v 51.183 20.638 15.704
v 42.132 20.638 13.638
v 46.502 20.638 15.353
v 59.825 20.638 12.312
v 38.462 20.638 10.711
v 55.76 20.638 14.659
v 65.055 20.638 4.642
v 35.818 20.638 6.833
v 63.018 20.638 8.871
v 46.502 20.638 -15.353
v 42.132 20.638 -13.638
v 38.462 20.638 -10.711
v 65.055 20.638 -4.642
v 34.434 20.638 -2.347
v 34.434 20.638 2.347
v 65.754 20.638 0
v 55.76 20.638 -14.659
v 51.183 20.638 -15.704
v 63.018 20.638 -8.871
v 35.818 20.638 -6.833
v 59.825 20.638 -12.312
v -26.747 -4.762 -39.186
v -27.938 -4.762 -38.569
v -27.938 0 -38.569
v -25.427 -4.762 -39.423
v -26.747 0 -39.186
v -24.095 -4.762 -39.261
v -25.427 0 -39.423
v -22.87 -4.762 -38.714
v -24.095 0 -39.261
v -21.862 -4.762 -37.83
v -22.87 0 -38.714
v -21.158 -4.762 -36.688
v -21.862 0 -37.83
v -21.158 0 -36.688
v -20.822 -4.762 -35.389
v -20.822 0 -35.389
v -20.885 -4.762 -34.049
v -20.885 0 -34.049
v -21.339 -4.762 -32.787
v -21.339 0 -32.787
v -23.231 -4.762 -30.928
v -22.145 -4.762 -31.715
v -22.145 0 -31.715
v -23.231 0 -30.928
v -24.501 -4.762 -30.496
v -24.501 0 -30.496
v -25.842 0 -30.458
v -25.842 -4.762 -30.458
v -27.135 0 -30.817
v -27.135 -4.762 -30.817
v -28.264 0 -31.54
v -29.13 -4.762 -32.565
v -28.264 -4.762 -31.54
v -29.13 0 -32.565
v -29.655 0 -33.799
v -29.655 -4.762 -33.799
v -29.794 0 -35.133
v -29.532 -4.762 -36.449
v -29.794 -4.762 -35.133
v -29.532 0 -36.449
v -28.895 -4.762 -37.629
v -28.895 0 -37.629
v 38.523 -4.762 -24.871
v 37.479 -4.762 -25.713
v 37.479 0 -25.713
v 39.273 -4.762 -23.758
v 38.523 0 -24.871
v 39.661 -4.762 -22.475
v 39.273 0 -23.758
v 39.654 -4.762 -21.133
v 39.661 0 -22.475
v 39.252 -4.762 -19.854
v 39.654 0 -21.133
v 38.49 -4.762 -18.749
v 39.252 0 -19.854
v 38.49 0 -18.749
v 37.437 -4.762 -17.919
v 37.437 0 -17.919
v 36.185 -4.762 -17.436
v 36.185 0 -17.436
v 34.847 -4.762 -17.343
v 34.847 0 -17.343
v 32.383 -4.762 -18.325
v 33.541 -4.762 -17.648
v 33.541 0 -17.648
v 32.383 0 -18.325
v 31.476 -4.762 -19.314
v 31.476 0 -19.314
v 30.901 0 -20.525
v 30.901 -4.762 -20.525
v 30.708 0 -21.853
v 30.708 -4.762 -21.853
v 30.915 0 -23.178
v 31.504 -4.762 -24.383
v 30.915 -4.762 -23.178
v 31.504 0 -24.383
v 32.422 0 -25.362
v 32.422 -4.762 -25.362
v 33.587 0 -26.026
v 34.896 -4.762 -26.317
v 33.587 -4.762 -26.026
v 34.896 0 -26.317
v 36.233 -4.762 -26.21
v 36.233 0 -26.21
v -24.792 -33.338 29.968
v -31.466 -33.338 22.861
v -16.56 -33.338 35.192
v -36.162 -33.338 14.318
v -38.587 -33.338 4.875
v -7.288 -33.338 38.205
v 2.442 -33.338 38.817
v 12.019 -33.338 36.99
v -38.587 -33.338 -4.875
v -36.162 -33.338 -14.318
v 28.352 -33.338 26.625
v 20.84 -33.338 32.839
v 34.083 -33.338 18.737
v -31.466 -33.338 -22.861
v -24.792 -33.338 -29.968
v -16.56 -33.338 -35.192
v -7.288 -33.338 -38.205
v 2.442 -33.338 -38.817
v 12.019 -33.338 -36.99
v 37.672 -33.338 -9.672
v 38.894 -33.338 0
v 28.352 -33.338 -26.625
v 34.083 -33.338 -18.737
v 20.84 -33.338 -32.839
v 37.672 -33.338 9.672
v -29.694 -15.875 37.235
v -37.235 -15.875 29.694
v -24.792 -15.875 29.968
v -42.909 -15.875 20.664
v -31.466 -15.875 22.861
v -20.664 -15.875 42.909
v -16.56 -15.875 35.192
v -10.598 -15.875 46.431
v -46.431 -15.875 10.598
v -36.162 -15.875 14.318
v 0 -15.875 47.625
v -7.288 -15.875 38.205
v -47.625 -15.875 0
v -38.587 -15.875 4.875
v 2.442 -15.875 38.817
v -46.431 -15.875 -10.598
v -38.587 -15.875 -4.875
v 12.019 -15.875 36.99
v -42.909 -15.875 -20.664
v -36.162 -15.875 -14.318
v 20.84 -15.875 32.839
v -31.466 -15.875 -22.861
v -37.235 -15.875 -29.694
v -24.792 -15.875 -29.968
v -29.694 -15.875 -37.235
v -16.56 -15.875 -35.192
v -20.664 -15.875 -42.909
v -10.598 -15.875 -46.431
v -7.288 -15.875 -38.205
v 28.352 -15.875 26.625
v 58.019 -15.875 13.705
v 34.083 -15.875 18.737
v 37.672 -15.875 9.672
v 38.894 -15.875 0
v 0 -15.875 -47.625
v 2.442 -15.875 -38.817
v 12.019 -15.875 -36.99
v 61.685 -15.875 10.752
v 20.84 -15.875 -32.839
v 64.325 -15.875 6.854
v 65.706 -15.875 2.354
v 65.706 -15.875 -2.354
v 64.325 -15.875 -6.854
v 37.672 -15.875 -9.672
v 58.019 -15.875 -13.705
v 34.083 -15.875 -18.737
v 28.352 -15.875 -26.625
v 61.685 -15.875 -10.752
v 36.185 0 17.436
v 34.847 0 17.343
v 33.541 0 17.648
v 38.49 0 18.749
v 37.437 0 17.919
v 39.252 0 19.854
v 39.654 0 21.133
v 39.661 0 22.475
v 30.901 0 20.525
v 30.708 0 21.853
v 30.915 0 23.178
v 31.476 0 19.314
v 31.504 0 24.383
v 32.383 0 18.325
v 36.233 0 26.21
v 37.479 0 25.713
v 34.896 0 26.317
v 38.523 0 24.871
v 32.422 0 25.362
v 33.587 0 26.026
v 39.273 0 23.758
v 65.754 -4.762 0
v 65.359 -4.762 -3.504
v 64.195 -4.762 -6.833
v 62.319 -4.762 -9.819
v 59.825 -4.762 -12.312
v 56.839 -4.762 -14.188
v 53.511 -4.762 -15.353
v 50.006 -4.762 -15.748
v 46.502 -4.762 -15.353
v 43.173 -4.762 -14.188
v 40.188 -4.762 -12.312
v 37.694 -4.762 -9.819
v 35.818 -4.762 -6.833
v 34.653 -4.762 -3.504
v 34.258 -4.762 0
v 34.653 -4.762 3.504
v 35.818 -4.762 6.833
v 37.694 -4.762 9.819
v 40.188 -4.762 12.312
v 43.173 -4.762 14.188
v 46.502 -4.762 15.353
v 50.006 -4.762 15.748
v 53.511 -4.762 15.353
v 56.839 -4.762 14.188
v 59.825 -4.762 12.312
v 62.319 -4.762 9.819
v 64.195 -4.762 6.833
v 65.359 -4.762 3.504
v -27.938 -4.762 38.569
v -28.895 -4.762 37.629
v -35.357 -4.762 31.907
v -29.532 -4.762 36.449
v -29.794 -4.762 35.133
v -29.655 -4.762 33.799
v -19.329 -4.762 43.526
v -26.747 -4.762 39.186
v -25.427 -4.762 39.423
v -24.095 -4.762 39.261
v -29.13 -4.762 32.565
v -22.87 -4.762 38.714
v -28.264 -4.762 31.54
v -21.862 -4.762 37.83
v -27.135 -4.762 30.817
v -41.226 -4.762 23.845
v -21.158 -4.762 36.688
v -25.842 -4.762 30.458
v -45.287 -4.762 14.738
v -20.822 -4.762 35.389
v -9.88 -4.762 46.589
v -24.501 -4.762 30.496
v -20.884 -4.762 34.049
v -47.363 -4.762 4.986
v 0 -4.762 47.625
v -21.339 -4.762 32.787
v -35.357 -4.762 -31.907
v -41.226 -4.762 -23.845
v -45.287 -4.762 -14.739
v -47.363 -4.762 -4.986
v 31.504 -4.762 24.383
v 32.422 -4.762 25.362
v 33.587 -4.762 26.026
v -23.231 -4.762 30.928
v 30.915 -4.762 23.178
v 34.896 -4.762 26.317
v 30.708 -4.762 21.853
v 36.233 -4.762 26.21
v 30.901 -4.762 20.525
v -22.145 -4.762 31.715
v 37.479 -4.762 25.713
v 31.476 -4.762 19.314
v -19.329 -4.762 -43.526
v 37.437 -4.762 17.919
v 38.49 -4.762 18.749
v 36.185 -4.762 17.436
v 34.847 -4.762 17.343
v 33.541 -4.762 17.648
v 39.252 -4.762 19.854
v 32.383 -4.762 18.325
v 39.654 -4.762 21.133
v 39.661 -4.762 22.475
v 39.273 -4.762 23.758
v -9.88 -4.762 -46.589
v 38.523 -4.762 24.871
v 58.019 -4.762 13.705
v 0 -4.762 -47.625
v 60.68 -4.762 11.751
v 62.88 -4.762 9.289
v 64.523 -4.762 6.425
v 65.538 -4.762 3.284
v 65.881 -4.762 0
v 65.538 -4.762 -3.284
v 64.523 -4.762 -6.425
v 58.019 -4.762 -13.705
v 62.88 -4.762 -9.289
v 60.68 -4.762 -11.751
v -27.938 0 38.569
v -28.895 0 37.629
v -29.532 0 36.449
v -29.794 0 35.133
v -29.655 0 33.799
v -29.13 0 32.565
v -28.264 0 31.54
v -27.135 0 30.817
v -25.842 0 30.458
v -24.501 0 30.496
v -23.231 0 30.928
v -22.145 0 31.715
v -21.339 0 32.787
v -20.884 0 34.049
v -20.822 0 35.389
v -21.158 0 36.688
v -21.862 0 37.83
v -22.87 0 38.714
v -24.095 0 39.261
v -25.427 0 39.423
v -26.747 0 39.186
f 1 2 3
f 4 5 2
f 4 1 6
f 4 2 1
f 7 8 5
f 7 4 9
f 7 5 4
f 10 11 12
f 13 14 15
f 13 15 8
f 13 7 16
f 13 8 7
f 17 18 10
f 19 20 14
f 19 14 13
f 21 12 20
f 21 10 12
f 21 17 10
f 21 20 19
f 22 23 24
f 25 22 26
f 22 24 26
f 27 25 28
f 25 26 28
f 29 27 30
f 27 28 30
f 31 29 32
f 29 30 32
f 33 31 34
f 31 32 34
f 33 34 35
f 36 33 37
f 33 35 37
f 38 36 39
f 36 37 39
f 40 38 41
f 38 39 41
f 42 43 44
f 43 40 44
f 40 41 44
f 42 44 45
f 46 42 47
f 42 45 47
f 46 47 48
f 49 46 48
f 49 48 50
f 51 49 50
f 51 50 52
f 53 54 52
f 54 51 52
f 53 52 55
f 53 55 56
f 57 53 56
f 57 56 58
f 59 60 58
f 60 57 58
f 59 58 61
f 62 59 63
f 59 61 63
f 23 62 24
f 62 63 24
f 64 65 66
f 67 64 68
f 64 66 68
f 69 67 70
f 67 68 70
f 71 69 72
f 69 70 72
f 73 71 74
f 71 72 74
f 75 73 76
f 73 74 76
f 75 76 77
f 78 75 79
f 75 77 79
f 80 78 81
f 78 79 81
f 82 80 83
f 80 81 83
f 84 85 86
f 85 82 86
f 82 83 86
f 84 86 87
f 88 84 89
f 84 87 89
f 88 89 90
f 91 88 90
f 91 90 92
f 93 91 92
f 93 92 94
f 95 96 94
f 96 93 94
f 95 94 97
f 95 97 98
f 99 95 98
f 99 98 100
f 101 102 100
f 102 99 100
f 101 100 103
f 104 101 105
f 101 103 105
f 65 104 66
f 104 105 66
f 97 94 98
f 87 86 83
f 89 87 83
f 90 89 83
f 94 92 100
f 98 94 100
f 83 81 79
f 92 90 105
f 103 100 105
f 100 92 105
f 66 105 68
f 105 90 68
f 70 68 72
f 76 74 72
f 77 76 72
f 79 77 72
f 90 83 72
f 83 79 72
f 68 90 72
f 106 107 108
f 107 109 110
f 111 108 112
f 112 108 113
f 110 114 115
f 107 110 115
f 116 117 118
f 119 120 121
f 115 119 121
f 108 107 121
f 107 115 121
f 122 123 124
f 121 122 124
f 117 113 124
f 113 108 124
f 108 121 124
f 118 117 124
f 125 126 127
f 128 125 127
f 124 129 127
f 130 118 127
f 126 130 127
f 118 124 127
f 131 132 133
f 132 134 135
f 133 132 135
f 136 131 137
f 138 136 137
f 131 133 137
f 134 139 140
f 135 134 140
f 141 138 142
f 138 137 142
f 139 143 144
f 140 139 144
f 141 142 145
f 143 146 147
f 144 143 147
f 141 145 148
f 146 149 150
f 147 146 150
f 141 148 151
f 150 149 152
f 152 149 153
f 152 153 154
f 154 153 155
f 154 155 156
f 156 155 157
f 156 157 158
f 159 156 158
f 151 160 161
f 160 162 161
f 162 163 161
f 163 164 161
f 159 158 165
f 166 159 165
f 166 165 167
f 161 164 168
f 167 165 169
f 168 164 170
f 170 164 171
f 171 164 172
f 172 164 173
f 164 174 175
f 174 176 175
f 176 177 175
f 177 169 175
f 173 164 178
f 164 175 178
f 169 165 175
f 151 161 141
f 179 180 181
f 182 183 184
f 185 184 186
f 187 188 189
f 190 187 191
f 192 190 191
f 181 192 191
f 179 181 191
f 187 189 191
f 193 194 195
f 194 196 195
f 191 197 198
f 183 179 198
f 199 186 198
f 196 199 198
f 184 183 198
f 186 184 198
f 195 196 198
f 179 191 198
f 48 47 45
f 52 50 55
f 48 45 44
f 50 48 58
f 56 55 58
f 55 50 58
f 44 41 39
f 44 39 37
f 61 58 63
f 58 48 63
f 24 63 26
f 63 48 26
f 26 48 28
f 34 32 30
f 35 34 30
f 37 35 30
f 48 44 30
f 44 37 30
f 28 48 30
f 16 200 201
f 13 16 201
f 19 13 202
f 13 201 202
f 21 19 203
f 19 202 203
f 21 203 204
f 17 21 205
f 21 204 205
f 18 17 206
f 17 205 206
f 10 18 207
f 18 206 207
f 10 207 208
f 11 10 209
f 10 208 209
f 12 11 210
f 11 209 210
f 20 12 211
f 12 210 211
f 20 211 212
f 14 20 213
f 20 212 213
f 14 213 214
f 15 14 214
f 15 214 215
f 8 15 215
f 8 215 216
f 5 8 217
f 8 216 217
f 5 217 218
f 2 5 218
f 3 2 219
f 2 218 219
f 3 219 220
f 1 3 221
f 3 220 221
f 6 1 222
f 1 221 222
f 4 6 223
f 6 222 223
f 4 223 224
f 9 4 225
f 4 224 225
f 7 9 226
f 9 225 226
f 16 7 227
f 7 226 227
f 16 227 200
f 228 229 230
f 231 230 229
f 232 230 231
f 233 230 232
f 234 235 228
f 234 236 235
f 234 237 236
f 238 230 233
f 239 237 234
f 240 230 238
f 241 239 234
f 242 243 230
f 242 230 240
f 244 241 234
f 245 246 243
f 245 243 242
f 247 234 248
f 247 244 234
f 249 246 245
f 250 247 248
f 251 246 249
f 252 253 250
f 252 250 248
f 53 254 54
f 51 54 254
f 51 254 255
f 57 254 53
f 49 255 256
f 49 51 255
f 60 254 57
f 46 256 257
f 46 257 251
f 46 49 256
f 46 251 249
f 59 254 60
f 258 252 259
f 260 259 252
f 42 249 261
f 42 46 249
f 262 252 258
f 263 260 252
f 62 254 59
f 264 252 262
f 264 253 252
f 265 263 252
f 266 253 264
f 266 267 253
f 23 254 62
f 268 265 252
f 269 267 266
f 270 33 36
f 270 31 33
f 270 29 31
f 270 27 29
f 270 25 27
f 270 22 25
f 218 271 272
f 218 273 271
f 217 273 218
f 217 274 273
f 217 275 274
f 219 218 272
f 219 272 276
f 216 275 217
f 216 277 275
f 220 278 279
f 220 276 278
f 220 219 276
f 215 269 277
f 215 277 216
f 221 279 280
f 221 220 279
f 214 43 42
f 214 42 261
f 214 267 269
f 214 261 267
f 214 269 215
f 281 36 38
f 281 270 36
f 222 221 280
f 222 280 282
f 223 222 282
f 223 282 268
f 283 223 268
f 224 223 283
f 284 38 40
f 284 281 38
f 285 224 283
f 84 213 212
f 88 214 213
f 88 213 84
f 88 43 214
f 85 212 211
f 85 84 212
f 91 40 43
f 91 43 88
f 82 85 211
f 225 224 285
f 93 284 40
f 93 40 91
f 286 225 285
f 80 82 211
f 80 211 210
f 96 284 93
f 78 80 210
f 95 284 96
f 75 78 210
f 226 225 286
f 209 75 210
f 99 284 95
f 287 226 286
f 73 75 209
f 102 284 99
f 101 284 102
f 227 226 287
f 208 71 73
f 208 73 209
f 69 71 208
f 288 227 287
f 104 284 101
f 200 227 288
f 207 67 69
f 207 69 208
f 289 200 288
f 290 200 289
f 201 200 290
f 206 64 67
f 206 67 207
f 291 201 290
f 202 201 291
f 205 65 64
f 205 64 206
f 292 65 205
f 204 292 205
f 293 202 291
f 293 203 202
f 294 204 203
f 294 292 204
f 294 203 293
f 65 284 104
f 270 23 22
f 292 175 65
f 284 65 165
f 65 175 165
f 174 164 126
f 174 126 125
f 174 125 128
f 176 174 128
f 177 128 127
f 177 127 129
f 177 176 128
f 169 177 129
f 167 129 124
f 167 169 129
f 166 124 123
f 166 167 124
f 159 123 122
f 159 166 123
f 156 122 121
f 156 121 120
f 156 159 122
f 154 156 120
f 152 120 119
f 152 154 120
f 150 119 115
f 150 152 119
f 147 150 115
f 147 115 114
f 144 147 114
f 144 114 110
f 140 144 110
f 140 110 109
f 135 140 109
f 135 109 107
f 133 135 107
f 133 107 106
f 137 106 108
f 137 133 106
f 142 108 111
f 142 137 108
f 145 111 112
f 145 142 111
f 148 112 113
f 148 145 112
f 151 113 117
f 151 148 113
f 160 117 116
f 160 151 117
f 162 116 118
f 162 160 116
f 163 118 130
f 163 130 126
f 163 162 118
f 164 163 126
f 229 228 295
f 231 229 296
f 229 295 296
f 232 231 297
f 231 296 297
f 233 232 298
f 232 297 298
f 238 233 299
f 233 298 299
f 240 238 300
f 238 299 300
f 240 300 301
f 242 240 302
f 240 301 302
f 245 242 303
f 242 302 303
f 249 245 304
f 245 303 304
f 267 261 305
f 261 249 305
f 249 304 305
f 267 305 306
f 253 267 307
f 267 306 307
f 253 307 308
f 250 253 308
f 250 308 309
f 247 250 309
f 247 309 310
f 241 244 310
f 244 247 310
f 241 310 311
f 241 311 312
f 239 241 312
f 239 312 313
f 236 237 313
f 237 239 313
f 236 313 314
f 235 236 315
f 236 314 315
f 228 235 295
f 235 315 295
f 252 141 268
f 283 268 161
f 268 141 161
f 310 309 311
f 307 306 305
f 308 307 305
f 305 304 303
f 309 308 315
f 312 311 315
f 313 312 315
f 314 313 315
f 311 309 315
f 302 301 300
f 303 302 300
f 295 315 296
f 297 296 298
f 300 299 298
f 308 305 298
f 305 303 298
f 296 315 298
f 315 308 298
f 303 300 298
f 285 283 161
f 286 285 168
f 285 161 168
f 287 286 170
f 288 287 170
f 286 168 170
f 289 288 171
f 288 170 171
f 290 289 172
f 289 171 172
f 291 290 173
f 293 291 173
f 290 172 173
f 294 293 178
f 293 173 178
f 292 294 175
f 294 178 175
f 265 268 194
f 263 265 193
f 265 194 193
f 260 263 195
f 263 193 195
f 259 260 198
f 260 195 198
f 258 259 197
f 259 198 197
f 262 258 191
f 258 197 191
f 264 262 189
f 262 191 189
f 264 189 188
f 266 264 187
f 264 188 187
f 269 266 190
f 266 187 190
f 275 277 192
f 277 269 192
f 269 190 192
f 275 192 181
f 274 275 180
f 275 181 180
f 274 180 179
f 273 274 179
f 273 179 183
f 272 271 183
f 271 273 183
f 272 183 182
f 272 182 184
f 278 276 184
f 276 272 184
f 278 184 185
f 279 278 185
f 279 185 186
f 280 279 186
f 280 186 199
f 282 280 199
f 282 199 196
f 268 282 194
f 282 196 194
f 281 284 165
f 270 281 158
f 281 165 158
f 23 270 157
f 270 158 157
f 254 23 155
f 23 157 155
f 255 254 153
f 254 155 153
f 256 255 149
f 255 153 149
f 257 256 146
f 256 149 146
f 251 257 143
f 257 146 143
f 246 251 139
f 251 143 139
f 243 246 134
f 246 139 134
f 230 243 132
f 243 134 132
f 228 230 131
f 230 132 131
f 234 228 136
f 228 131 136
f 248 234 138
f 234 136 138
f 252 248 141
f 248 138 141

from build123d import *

# Parameters (mm, degrees)
BOSS_EXTRUDE1_START = -15.875
SKETCH1_R           = 38.89375
BOSS_EXTRUDE1_DEPTH = 17.4625
BOSS_EXTRUDE2_START = 15.875
BOSS_EXTRUDE2_DEPTH = 11.1125
BOSS_EXTRUDE3_REACH = 89.863
SKETCH3_R           = 4.5
SKETCH4_R           = 15.748
BOSS_EXTRUDE4_DEPTH = 25.4


with BuildPart() as part:
    # Sketch1 → Boss-Extrude1 (new body)
    with BuildSketch(Plane(origin=(0, 0, 0), x_dir=(1, 0, 0), z_dir=(0, 1, 0)).offset(BOSS_EXTRUDE1_START)):
        Circle(SKETCH1_R)
    extrude(amount=-BOSS_EXTRUDE1_DEPTH)

    # Sketch2 → Boss-Extrude2 (add)
    with BuildSketch(Plane(origin=(0, 0, 0), x_dir=(-1, 0, 0), z_dir=(0, -1, 0)).offset(BOSS_EXTRUDE2_START)):
        with BuildLine():
            Line((-58.018619526, 13.704654669), (0, 47.625))
            ThreePointArc((0, 47.625), (47.625, 0), (0, -47.625))
            Line((0, -47.625), (-58.018619526, -13.704654669))
            ThreePointArc((-58.018619526, -13.704654669), (-65.88125, 0), (-58.018619526, 13.704654669))
        make_face()
    extrude(amount=-BOSS_EXTRUDE2_DEPTH)

    # Sketch3 → Boss-Extrude3 (add, up to next)
    with BuildSketch(Plane(origin=(0, 0, 0), x_dir=(-1, 0, 0), z_dir=(0, -1, 0)), mode=Mode.PRIVATE) as boss_extrude3_sk1:
        with Locations(Location((-35.208032093, 21.828125, 0), (0, 0, 120.312514276))):
            Circle(SKETCH3_R)
    boss_extrude3_tool1 = extrude(boss_extrude3_sk1.sketch, amount=BOSS_EXTRUDE3_REACH, mode=Mode.PRIVATE) - part.part
    # Sketch3 → Boss-Extrude3 (add, up to next)
    with BuildSketch(Plane(origin=(0, 0, 0), x_dir=(-1, 0, 0), z_dir=(0, -1, 0)), mode=Mode.PRIVATE) as boss_extrude3_sk2:
        with Locations(Location((-35.208032093, -21.828125, 0), (0, 0, 239.687485724))):
            Circle(SKETCH3_R)
    boss_extrude3_tool2 = extrude(boss_extrude3_sk2.sketch, amount=BOSS_EXTRUDE3_REACH, mode=Mode.PRIVATE) - part.part
    # Sketch3 → Boss-Extrude3 (add, up to next)
    with BuildSketch(Plane(origin=(0, 0, 0), x_dir=(-1, 0, 0), z_dir=(0, -1, 0)), mode=Mode.PRIVATE) as boss_extrude3_sk3:
        with Locations(Location((25.298418923, -34.925, 0), (0, 0, 305.918677721))):
            Circle(SKETCH3_R)
    boss_extrude3_tool3 = extrude(boss_extrude3_sk3.sketch, amount=BOSS_EXTRUDE3_REACH, mode=Mode.PRIVATE) - part.part
    # Sketch3 → Boss-Extrude3 (add, up to next)
    with BuildSketch(Plane(origin=(0, 0, 0), x_dir=(-1, 0, 0), z_dir=(0, -1, 0)), mode=Mode.PRIVATE) as boss_extrude3_sk4:
        with Locations(Location((25.298418923, 34.925, 0), (0, 0, 54.082225764))):
            Circle(SKETCH3_R)
    boss_extrude3_tool4 = extrude(boss_extrude3_sk4.sketch, amount=BOSS_EXTRUDE3_REACH, mode=Mode.PRIVATE) - part.part
    add(boss_extrude3_tool1.solids().sort_by_distance((35.208032, 0, -21.828125))[0])
    add(boss_extrude3_tool2.solids().sort_by_distance((35.208032, 0, 21.828125))[0])
    add(boss_extrude3_tool3.solids().sort_by_distance((-25.298419, 0, 34.925))[0])
    add(boss_extrude3_tool4.solids().sort_by_distance((-25.298419, 0, -34.925))[0])

    # Sketch4 → Boss-Extrude4 (add)
    with BuildSketch(Plane(origin=(0, -4.7625, 0), x_dir=(1, 0, 0), z_dir=(0, 1, 0))):
        with Locations((50.00625, 0)):
            Circle(SKETCH4_R)
    extrude(amount=BOSS_EXTRUDE4_DEPTH)


solid = part.part
